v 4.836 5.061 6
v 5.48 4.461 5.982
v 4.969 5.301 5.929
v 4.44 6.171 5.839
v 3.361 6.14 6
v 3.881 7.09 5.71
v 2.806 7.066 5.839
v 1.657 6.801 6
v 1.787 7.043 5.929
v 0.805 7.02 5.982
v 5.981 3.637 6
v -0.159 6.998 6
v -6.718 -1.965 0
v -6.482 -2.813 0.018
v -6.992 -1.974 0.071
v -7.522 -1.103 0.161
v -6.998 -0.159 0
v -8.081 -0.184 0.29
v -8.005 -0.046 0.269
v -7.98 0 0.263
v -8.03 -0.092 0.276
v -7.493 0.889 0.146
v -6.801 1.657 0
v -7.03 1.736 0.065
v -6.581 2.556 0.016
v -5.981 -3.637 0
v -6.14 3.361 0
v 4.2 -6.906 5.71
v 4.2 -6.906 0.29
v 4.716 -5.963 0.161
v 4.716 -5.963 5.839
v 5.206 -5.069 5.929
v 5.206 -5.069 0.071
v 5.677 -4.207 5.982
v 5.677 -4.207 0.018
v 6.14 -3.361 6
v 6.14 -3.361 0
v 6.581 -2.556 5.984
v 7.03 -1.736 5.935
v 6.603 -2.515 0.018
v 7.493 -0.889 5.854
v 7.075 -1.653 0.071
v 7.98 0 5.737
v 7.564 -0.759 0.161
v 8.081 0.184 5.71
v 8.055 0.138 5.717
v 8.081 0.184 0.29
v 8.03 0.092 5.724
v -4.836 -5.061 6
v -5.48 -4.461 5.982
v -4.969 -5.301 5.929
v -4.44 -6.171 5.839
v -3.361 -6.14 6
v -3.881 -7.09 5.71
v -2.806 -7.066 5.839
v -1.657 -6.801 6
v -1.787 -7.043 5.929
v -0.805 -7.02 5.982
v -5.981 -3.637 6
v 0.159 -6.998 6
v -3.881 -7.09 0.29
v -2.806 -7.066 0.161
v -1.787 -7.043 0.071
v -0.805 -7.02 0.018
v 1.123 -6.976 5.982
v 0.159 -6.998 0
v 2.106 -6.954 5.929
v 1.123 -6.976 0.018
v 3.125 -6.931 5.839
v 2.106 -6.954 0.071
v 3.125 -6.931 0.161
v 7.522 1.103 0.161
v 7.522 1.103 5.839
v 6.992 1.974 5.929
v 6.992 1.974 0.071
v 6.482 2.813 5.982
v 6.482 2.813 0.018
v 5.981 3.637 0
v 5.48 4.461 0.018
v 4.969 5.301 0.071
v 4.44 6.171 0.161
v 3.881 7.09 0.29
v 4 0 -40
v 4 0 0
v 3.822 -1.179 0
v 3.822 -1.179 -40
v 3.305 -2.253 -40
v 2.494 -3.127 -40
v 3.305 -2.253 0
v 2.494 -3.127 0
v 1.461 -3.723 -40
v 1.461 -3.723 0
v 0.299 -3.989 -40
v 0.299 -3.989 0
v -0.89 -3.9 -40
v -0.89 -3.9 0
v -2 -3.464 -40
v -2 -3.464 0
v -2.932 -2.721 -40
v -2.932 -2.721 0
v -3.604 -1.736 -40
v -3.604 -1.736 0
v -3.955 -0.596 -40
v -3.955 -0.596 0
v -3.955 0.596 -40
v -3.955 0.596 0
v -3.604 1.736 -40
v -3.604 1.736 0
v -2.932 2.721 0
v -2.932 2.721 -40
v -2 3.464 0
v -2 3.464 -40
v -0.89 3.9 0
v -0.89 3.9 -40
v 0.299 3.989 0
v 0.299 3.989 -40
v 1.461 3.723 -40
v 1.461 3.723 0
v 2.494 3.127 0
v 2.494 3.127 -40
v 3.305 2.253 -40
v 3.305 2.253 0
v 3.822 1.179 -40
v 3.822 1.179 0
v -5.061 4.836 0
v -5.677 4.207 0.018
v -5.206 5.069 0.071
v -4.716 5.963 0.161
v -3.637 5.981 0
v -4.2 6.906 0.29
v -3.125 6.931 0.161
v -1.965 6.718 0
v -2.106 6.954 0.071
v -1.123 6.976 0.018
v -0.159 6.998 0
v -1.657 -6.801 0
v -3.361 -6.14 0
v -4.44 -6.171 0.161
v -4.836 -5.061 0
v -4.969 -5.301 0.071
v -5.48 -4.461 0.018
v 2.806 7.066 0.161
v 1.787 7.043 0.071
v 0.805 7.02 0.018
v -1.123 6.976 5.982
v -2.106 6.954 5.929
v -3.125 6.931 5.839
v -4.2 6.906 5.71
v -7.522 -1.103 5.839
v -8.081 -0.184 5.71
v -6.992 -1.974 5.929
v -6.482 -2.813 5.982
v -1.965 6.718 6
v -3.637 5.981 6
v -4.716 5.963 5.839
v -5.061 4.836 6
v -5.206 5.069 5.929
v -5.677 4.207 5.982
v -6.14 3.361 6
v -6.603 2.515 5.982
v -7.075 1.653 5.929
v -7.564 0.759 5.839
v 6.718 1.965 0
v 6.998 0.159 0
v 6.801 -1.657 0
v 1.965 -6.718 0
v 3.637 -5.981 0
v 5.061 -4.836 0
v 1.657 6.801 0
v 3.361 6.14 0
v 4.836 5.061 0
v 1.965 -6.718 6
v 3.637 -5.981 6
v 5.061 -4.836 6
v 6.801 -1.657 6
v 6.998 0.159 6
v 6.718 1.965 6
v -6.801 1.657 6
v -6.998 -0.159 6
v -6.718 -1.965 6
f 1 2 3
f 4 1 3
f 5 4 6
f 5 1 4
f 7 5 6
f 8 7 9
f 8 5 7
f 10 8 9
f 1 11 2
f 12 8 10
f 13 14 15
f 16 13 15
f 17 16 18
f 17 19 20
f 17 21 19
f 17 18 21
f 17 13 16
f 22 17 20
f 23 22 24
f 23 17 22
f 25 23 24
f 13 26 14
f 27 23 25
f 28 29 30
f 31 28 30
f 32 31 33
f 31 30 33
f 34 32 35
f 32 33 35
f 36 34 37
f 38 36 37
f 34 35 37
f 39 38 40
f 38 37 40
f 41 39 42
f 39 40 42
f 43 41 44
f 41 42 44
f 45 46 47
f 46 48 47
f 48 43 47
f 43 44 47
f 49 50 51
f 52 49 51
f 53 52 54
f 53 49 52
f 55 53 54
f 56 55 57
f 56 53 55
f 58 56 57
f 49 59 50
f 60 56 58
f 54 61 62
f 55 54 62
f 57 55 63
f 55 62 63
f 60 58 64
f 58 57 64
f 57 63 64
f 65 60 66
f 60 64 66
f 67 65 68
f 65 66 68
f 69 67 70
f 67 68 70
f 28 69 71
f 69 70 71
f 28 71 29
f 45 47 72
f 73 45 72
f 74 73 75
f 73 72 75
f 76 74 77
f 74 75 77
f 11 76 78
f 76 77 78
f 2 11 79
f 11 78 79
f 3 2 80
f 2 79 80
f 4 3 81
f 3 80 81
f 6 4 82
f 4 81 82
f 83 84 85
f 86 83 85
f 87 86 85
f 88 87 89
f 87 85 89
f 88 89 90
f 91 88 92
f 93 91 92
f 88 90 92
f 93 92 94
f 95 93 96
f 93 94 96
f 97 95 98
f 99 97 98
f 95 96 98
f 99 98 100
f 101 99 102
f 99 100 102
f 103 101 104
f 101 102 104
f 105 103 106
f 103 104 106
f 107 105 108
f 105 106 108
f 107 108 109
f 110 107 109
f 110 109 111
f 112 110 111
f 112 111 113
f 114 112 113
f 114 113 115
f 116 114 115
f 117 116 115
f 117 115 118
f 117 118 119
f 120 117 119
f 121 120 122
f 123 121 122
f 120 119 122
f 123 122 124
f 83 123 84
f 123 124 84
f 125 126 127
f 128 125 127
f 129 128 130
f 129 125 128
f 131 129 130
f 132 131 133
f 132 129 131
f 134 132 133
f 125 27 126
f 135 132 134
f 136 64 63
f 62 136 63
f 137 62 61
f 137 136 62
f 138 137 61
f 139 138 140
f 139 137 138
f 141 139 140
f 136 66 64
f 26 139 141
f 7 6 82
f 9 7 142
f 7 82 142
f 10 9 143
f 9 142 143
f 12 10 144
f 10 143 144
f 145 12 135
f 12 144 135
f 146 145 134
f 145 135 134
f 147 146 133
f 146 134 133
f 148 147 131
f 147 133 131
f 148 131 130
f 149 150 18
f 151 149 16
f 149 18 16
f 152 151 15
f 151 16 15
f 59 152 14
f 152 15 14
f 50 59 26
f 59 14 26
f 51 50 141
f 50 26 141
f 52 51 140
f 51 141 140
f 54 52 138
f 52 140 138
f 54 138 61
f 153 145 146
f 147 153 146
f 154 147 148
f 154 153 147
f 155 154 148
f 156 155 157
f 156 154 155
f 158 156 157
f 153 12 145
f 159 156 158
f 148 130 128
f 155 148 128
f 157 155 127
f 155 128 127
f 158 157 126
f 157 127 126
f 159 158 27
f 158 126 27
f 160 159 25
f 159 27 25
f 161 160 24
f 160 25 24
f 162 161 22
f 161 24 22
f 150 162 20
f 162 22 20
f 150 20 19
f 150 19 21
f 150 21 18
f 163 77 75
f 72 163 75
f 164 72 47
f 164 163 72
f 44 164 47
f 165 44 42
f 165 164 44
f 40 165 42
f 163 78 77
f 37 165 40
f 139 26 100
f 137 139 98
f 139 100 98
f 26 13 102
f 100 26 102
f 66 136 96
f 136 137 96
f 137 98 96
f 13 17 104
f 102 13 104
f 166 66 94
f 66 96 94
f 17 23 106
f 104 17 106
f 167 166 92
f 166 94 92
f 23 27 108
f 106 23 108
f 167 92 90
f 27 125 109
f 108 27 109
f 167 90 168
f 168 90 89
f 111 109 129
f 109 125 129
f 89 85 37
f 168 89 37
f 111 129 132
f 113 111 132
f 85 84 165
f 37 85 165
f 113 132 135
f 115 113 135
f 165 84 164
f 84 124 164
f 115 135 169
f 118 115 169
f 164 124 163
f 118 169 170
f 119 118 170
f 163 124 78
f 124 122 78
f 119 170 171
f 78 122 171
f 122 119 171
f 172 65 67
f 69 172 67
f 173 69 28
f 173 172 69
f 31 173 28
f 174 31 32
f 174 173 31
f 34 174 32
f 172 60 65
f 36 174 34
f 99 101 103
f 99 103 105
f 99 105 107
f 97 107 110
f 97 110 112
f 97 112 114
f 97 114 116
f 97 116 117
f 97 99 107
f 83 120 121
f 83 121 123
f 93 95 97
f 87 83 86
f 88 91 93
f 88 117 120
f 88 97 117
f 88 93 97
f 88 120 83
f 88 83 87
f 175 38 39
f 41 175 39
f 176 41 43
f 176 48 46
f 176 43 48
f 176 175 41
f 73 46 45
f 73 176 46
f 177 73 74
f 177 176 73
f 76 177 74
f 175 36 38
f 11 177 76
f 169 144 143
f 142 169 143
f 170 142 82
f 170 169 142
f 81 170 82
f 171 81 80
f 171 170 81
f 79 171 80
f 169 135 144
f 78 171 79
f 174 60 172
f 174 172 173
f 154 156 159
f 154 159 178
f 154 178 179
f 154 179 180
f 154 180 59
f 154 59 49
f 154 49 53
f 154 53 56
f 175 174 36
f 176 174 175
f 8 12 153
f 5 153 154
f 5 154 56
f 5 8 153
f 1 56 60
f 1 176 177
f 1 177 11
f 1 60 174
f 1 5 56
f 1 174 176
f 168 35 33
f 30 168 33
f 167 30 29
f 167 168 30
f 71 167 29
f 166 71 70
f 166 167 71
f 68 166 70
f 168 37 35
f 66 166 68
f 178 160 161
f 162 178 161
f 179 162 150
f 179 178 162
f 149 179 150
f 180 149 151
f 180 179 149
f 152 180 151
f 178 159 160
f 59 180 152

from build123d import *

# Parameters (mm, degrees)
RESSALTO_EXTRUS_O1_DEPTH = 6
ESBO_O2_OUTSIDE_W        = 119.66
ESBO_O2_OUTSIDE_H        = 117.678
ESBO_O2_OUTSIDE_R        = 7
CORTE_EXTRUS_O1_DEPTH    = 13
CORTE_EXTRUS_O1_DRAFT    = -75
ESBO_O9_OUTSIDE_W        = 119.66
ESBO_O9_OUTSIDE_H        = 117.678
ESBO_O9_OUTSIDE_R        = 7
CORTE_EXTRUS_O6_DEPTH    = 13
CORTE_EXTRUS_O6_DRAFT    = -75
ESBO_O10_R               = 4
RESSALTO_EXTRUS_O2_DEPTH = 40


with BuildPart() as part:
    # Esboço1 → Ressalto-extrusão1 (new body)
    with BuildSketch(Plane.XY):
        Polygon((3.880998386, 7.090217547), (-4.199809321, 6.906151968), (-8.080807707, -0.184065579), (-3.880998386, -7.090217547), (4.199809321, -6.906151968), (8.080807707, 0.184065579), align=None)
    extrude(amount=RESSALTO_EXTRUS_O1_DEPTH)


with BuildPart() as corte_extrus_o1_tool:
    # Esboço2 outside → Corte-extrusão1 (with draft: the straight prism first)
    with BuildSketch(Plane.XY.offset(6)):
        Rectangle(ESBO_O2_OUTSIDE_W, ESBO_O2_OUTSIDE_H)
        Circle(ESBO_O2_OUTSIDE_R, mode=Mode.SUBTRACT)
    extrude(amount=-CORTE_EXTRUS_O1_DEPTH)
    # Corte-extrusão1: the draft: its side faces are tilted about the plane it starts from
    corte_extrus_o1_sides = [corte_extrus_o1_tool.faces().sort_by_distance(p)[0] for p in [
        (0, -58.839, -0.5),
        (59.83, 0, -0.5),
        (0, 58.839, -0.5),
        (-59.83, 0, -0.5),
        (-7, 0, -0.5),
    ]]
    draft(corte_extrus_o1_sides, Plane.XY.offset(6), CORTE_EXTRUS_O1_DRAFT)


with BuildPart() as part_1:
    add(part.part)

    # Corte-extrusão1: cut by corte_extrus_o1_tool
    add(corte_extrus_o1_tool.part, mode=Mode.SUBTRACT)


with BuildPart() as corte_extrus_o6_tool:
    # Esboço9 outside → Corte-extrusão6 (with draft: the straight prism first)
    with BuildSketch(Plane(origin=(0, 0, 0), x_dir=(-1, 0, 0), z_dir=(0, 0, -1))):
        Rectangle(ESBO_O9_OUTSIDE_W, ESBO_O9_OUTSIDE_H)
        Circle(ESBO_O9_OUTSIDE_R, mode=Mode.SUBTRACT)
    extrude(amount=-CORTE_EXTRUS_O6_DEPTH)
    # Corte-extrusão6: the draft: its side faces are tilted about the plane it starts from
    corte_extrus_o6_sides = [corte_extrus_o6_tool.faces().sort_by_distance(p)[0] for p in [
        (0, -58.839, 6.5),
        (-59.83, 0, 6.5),
        (0, 58.839, 6.5),
        (59.83, 0, 6.5),
        (7, 0, 6.5),
    ]]
    draft(corte_extrus_o6_sides, Plane(origin=(0, 0, 0), x_dir=(-1, 0, 0), z_dir=(0, 0, -1)), CORTE_EXTRUS_O6_DRAFT)


with BuildPart() as part_2:
    add(part_1.part)

    # Corte-extrusão6: cut by corte_extrus_o6_tool
    add(corte_extrus_o6_tool.part, mode=Mode.SUBTRACT)

    # Esboço10 → Ressalto-extrusão2 (add)
    with BuildSketch(Plane(origin=(0, 0, 0), x_dir=(-1, 0, 0), z_dir=(0, 0, -1))):
        with Locations(Location((0, 0, 0), (0, 0, 180))):
            Circle(ESBO_O10_R)
    extrude(amount=RESSALTO_EXTRUS_O2_DEPTH)


solid = part_2.part
